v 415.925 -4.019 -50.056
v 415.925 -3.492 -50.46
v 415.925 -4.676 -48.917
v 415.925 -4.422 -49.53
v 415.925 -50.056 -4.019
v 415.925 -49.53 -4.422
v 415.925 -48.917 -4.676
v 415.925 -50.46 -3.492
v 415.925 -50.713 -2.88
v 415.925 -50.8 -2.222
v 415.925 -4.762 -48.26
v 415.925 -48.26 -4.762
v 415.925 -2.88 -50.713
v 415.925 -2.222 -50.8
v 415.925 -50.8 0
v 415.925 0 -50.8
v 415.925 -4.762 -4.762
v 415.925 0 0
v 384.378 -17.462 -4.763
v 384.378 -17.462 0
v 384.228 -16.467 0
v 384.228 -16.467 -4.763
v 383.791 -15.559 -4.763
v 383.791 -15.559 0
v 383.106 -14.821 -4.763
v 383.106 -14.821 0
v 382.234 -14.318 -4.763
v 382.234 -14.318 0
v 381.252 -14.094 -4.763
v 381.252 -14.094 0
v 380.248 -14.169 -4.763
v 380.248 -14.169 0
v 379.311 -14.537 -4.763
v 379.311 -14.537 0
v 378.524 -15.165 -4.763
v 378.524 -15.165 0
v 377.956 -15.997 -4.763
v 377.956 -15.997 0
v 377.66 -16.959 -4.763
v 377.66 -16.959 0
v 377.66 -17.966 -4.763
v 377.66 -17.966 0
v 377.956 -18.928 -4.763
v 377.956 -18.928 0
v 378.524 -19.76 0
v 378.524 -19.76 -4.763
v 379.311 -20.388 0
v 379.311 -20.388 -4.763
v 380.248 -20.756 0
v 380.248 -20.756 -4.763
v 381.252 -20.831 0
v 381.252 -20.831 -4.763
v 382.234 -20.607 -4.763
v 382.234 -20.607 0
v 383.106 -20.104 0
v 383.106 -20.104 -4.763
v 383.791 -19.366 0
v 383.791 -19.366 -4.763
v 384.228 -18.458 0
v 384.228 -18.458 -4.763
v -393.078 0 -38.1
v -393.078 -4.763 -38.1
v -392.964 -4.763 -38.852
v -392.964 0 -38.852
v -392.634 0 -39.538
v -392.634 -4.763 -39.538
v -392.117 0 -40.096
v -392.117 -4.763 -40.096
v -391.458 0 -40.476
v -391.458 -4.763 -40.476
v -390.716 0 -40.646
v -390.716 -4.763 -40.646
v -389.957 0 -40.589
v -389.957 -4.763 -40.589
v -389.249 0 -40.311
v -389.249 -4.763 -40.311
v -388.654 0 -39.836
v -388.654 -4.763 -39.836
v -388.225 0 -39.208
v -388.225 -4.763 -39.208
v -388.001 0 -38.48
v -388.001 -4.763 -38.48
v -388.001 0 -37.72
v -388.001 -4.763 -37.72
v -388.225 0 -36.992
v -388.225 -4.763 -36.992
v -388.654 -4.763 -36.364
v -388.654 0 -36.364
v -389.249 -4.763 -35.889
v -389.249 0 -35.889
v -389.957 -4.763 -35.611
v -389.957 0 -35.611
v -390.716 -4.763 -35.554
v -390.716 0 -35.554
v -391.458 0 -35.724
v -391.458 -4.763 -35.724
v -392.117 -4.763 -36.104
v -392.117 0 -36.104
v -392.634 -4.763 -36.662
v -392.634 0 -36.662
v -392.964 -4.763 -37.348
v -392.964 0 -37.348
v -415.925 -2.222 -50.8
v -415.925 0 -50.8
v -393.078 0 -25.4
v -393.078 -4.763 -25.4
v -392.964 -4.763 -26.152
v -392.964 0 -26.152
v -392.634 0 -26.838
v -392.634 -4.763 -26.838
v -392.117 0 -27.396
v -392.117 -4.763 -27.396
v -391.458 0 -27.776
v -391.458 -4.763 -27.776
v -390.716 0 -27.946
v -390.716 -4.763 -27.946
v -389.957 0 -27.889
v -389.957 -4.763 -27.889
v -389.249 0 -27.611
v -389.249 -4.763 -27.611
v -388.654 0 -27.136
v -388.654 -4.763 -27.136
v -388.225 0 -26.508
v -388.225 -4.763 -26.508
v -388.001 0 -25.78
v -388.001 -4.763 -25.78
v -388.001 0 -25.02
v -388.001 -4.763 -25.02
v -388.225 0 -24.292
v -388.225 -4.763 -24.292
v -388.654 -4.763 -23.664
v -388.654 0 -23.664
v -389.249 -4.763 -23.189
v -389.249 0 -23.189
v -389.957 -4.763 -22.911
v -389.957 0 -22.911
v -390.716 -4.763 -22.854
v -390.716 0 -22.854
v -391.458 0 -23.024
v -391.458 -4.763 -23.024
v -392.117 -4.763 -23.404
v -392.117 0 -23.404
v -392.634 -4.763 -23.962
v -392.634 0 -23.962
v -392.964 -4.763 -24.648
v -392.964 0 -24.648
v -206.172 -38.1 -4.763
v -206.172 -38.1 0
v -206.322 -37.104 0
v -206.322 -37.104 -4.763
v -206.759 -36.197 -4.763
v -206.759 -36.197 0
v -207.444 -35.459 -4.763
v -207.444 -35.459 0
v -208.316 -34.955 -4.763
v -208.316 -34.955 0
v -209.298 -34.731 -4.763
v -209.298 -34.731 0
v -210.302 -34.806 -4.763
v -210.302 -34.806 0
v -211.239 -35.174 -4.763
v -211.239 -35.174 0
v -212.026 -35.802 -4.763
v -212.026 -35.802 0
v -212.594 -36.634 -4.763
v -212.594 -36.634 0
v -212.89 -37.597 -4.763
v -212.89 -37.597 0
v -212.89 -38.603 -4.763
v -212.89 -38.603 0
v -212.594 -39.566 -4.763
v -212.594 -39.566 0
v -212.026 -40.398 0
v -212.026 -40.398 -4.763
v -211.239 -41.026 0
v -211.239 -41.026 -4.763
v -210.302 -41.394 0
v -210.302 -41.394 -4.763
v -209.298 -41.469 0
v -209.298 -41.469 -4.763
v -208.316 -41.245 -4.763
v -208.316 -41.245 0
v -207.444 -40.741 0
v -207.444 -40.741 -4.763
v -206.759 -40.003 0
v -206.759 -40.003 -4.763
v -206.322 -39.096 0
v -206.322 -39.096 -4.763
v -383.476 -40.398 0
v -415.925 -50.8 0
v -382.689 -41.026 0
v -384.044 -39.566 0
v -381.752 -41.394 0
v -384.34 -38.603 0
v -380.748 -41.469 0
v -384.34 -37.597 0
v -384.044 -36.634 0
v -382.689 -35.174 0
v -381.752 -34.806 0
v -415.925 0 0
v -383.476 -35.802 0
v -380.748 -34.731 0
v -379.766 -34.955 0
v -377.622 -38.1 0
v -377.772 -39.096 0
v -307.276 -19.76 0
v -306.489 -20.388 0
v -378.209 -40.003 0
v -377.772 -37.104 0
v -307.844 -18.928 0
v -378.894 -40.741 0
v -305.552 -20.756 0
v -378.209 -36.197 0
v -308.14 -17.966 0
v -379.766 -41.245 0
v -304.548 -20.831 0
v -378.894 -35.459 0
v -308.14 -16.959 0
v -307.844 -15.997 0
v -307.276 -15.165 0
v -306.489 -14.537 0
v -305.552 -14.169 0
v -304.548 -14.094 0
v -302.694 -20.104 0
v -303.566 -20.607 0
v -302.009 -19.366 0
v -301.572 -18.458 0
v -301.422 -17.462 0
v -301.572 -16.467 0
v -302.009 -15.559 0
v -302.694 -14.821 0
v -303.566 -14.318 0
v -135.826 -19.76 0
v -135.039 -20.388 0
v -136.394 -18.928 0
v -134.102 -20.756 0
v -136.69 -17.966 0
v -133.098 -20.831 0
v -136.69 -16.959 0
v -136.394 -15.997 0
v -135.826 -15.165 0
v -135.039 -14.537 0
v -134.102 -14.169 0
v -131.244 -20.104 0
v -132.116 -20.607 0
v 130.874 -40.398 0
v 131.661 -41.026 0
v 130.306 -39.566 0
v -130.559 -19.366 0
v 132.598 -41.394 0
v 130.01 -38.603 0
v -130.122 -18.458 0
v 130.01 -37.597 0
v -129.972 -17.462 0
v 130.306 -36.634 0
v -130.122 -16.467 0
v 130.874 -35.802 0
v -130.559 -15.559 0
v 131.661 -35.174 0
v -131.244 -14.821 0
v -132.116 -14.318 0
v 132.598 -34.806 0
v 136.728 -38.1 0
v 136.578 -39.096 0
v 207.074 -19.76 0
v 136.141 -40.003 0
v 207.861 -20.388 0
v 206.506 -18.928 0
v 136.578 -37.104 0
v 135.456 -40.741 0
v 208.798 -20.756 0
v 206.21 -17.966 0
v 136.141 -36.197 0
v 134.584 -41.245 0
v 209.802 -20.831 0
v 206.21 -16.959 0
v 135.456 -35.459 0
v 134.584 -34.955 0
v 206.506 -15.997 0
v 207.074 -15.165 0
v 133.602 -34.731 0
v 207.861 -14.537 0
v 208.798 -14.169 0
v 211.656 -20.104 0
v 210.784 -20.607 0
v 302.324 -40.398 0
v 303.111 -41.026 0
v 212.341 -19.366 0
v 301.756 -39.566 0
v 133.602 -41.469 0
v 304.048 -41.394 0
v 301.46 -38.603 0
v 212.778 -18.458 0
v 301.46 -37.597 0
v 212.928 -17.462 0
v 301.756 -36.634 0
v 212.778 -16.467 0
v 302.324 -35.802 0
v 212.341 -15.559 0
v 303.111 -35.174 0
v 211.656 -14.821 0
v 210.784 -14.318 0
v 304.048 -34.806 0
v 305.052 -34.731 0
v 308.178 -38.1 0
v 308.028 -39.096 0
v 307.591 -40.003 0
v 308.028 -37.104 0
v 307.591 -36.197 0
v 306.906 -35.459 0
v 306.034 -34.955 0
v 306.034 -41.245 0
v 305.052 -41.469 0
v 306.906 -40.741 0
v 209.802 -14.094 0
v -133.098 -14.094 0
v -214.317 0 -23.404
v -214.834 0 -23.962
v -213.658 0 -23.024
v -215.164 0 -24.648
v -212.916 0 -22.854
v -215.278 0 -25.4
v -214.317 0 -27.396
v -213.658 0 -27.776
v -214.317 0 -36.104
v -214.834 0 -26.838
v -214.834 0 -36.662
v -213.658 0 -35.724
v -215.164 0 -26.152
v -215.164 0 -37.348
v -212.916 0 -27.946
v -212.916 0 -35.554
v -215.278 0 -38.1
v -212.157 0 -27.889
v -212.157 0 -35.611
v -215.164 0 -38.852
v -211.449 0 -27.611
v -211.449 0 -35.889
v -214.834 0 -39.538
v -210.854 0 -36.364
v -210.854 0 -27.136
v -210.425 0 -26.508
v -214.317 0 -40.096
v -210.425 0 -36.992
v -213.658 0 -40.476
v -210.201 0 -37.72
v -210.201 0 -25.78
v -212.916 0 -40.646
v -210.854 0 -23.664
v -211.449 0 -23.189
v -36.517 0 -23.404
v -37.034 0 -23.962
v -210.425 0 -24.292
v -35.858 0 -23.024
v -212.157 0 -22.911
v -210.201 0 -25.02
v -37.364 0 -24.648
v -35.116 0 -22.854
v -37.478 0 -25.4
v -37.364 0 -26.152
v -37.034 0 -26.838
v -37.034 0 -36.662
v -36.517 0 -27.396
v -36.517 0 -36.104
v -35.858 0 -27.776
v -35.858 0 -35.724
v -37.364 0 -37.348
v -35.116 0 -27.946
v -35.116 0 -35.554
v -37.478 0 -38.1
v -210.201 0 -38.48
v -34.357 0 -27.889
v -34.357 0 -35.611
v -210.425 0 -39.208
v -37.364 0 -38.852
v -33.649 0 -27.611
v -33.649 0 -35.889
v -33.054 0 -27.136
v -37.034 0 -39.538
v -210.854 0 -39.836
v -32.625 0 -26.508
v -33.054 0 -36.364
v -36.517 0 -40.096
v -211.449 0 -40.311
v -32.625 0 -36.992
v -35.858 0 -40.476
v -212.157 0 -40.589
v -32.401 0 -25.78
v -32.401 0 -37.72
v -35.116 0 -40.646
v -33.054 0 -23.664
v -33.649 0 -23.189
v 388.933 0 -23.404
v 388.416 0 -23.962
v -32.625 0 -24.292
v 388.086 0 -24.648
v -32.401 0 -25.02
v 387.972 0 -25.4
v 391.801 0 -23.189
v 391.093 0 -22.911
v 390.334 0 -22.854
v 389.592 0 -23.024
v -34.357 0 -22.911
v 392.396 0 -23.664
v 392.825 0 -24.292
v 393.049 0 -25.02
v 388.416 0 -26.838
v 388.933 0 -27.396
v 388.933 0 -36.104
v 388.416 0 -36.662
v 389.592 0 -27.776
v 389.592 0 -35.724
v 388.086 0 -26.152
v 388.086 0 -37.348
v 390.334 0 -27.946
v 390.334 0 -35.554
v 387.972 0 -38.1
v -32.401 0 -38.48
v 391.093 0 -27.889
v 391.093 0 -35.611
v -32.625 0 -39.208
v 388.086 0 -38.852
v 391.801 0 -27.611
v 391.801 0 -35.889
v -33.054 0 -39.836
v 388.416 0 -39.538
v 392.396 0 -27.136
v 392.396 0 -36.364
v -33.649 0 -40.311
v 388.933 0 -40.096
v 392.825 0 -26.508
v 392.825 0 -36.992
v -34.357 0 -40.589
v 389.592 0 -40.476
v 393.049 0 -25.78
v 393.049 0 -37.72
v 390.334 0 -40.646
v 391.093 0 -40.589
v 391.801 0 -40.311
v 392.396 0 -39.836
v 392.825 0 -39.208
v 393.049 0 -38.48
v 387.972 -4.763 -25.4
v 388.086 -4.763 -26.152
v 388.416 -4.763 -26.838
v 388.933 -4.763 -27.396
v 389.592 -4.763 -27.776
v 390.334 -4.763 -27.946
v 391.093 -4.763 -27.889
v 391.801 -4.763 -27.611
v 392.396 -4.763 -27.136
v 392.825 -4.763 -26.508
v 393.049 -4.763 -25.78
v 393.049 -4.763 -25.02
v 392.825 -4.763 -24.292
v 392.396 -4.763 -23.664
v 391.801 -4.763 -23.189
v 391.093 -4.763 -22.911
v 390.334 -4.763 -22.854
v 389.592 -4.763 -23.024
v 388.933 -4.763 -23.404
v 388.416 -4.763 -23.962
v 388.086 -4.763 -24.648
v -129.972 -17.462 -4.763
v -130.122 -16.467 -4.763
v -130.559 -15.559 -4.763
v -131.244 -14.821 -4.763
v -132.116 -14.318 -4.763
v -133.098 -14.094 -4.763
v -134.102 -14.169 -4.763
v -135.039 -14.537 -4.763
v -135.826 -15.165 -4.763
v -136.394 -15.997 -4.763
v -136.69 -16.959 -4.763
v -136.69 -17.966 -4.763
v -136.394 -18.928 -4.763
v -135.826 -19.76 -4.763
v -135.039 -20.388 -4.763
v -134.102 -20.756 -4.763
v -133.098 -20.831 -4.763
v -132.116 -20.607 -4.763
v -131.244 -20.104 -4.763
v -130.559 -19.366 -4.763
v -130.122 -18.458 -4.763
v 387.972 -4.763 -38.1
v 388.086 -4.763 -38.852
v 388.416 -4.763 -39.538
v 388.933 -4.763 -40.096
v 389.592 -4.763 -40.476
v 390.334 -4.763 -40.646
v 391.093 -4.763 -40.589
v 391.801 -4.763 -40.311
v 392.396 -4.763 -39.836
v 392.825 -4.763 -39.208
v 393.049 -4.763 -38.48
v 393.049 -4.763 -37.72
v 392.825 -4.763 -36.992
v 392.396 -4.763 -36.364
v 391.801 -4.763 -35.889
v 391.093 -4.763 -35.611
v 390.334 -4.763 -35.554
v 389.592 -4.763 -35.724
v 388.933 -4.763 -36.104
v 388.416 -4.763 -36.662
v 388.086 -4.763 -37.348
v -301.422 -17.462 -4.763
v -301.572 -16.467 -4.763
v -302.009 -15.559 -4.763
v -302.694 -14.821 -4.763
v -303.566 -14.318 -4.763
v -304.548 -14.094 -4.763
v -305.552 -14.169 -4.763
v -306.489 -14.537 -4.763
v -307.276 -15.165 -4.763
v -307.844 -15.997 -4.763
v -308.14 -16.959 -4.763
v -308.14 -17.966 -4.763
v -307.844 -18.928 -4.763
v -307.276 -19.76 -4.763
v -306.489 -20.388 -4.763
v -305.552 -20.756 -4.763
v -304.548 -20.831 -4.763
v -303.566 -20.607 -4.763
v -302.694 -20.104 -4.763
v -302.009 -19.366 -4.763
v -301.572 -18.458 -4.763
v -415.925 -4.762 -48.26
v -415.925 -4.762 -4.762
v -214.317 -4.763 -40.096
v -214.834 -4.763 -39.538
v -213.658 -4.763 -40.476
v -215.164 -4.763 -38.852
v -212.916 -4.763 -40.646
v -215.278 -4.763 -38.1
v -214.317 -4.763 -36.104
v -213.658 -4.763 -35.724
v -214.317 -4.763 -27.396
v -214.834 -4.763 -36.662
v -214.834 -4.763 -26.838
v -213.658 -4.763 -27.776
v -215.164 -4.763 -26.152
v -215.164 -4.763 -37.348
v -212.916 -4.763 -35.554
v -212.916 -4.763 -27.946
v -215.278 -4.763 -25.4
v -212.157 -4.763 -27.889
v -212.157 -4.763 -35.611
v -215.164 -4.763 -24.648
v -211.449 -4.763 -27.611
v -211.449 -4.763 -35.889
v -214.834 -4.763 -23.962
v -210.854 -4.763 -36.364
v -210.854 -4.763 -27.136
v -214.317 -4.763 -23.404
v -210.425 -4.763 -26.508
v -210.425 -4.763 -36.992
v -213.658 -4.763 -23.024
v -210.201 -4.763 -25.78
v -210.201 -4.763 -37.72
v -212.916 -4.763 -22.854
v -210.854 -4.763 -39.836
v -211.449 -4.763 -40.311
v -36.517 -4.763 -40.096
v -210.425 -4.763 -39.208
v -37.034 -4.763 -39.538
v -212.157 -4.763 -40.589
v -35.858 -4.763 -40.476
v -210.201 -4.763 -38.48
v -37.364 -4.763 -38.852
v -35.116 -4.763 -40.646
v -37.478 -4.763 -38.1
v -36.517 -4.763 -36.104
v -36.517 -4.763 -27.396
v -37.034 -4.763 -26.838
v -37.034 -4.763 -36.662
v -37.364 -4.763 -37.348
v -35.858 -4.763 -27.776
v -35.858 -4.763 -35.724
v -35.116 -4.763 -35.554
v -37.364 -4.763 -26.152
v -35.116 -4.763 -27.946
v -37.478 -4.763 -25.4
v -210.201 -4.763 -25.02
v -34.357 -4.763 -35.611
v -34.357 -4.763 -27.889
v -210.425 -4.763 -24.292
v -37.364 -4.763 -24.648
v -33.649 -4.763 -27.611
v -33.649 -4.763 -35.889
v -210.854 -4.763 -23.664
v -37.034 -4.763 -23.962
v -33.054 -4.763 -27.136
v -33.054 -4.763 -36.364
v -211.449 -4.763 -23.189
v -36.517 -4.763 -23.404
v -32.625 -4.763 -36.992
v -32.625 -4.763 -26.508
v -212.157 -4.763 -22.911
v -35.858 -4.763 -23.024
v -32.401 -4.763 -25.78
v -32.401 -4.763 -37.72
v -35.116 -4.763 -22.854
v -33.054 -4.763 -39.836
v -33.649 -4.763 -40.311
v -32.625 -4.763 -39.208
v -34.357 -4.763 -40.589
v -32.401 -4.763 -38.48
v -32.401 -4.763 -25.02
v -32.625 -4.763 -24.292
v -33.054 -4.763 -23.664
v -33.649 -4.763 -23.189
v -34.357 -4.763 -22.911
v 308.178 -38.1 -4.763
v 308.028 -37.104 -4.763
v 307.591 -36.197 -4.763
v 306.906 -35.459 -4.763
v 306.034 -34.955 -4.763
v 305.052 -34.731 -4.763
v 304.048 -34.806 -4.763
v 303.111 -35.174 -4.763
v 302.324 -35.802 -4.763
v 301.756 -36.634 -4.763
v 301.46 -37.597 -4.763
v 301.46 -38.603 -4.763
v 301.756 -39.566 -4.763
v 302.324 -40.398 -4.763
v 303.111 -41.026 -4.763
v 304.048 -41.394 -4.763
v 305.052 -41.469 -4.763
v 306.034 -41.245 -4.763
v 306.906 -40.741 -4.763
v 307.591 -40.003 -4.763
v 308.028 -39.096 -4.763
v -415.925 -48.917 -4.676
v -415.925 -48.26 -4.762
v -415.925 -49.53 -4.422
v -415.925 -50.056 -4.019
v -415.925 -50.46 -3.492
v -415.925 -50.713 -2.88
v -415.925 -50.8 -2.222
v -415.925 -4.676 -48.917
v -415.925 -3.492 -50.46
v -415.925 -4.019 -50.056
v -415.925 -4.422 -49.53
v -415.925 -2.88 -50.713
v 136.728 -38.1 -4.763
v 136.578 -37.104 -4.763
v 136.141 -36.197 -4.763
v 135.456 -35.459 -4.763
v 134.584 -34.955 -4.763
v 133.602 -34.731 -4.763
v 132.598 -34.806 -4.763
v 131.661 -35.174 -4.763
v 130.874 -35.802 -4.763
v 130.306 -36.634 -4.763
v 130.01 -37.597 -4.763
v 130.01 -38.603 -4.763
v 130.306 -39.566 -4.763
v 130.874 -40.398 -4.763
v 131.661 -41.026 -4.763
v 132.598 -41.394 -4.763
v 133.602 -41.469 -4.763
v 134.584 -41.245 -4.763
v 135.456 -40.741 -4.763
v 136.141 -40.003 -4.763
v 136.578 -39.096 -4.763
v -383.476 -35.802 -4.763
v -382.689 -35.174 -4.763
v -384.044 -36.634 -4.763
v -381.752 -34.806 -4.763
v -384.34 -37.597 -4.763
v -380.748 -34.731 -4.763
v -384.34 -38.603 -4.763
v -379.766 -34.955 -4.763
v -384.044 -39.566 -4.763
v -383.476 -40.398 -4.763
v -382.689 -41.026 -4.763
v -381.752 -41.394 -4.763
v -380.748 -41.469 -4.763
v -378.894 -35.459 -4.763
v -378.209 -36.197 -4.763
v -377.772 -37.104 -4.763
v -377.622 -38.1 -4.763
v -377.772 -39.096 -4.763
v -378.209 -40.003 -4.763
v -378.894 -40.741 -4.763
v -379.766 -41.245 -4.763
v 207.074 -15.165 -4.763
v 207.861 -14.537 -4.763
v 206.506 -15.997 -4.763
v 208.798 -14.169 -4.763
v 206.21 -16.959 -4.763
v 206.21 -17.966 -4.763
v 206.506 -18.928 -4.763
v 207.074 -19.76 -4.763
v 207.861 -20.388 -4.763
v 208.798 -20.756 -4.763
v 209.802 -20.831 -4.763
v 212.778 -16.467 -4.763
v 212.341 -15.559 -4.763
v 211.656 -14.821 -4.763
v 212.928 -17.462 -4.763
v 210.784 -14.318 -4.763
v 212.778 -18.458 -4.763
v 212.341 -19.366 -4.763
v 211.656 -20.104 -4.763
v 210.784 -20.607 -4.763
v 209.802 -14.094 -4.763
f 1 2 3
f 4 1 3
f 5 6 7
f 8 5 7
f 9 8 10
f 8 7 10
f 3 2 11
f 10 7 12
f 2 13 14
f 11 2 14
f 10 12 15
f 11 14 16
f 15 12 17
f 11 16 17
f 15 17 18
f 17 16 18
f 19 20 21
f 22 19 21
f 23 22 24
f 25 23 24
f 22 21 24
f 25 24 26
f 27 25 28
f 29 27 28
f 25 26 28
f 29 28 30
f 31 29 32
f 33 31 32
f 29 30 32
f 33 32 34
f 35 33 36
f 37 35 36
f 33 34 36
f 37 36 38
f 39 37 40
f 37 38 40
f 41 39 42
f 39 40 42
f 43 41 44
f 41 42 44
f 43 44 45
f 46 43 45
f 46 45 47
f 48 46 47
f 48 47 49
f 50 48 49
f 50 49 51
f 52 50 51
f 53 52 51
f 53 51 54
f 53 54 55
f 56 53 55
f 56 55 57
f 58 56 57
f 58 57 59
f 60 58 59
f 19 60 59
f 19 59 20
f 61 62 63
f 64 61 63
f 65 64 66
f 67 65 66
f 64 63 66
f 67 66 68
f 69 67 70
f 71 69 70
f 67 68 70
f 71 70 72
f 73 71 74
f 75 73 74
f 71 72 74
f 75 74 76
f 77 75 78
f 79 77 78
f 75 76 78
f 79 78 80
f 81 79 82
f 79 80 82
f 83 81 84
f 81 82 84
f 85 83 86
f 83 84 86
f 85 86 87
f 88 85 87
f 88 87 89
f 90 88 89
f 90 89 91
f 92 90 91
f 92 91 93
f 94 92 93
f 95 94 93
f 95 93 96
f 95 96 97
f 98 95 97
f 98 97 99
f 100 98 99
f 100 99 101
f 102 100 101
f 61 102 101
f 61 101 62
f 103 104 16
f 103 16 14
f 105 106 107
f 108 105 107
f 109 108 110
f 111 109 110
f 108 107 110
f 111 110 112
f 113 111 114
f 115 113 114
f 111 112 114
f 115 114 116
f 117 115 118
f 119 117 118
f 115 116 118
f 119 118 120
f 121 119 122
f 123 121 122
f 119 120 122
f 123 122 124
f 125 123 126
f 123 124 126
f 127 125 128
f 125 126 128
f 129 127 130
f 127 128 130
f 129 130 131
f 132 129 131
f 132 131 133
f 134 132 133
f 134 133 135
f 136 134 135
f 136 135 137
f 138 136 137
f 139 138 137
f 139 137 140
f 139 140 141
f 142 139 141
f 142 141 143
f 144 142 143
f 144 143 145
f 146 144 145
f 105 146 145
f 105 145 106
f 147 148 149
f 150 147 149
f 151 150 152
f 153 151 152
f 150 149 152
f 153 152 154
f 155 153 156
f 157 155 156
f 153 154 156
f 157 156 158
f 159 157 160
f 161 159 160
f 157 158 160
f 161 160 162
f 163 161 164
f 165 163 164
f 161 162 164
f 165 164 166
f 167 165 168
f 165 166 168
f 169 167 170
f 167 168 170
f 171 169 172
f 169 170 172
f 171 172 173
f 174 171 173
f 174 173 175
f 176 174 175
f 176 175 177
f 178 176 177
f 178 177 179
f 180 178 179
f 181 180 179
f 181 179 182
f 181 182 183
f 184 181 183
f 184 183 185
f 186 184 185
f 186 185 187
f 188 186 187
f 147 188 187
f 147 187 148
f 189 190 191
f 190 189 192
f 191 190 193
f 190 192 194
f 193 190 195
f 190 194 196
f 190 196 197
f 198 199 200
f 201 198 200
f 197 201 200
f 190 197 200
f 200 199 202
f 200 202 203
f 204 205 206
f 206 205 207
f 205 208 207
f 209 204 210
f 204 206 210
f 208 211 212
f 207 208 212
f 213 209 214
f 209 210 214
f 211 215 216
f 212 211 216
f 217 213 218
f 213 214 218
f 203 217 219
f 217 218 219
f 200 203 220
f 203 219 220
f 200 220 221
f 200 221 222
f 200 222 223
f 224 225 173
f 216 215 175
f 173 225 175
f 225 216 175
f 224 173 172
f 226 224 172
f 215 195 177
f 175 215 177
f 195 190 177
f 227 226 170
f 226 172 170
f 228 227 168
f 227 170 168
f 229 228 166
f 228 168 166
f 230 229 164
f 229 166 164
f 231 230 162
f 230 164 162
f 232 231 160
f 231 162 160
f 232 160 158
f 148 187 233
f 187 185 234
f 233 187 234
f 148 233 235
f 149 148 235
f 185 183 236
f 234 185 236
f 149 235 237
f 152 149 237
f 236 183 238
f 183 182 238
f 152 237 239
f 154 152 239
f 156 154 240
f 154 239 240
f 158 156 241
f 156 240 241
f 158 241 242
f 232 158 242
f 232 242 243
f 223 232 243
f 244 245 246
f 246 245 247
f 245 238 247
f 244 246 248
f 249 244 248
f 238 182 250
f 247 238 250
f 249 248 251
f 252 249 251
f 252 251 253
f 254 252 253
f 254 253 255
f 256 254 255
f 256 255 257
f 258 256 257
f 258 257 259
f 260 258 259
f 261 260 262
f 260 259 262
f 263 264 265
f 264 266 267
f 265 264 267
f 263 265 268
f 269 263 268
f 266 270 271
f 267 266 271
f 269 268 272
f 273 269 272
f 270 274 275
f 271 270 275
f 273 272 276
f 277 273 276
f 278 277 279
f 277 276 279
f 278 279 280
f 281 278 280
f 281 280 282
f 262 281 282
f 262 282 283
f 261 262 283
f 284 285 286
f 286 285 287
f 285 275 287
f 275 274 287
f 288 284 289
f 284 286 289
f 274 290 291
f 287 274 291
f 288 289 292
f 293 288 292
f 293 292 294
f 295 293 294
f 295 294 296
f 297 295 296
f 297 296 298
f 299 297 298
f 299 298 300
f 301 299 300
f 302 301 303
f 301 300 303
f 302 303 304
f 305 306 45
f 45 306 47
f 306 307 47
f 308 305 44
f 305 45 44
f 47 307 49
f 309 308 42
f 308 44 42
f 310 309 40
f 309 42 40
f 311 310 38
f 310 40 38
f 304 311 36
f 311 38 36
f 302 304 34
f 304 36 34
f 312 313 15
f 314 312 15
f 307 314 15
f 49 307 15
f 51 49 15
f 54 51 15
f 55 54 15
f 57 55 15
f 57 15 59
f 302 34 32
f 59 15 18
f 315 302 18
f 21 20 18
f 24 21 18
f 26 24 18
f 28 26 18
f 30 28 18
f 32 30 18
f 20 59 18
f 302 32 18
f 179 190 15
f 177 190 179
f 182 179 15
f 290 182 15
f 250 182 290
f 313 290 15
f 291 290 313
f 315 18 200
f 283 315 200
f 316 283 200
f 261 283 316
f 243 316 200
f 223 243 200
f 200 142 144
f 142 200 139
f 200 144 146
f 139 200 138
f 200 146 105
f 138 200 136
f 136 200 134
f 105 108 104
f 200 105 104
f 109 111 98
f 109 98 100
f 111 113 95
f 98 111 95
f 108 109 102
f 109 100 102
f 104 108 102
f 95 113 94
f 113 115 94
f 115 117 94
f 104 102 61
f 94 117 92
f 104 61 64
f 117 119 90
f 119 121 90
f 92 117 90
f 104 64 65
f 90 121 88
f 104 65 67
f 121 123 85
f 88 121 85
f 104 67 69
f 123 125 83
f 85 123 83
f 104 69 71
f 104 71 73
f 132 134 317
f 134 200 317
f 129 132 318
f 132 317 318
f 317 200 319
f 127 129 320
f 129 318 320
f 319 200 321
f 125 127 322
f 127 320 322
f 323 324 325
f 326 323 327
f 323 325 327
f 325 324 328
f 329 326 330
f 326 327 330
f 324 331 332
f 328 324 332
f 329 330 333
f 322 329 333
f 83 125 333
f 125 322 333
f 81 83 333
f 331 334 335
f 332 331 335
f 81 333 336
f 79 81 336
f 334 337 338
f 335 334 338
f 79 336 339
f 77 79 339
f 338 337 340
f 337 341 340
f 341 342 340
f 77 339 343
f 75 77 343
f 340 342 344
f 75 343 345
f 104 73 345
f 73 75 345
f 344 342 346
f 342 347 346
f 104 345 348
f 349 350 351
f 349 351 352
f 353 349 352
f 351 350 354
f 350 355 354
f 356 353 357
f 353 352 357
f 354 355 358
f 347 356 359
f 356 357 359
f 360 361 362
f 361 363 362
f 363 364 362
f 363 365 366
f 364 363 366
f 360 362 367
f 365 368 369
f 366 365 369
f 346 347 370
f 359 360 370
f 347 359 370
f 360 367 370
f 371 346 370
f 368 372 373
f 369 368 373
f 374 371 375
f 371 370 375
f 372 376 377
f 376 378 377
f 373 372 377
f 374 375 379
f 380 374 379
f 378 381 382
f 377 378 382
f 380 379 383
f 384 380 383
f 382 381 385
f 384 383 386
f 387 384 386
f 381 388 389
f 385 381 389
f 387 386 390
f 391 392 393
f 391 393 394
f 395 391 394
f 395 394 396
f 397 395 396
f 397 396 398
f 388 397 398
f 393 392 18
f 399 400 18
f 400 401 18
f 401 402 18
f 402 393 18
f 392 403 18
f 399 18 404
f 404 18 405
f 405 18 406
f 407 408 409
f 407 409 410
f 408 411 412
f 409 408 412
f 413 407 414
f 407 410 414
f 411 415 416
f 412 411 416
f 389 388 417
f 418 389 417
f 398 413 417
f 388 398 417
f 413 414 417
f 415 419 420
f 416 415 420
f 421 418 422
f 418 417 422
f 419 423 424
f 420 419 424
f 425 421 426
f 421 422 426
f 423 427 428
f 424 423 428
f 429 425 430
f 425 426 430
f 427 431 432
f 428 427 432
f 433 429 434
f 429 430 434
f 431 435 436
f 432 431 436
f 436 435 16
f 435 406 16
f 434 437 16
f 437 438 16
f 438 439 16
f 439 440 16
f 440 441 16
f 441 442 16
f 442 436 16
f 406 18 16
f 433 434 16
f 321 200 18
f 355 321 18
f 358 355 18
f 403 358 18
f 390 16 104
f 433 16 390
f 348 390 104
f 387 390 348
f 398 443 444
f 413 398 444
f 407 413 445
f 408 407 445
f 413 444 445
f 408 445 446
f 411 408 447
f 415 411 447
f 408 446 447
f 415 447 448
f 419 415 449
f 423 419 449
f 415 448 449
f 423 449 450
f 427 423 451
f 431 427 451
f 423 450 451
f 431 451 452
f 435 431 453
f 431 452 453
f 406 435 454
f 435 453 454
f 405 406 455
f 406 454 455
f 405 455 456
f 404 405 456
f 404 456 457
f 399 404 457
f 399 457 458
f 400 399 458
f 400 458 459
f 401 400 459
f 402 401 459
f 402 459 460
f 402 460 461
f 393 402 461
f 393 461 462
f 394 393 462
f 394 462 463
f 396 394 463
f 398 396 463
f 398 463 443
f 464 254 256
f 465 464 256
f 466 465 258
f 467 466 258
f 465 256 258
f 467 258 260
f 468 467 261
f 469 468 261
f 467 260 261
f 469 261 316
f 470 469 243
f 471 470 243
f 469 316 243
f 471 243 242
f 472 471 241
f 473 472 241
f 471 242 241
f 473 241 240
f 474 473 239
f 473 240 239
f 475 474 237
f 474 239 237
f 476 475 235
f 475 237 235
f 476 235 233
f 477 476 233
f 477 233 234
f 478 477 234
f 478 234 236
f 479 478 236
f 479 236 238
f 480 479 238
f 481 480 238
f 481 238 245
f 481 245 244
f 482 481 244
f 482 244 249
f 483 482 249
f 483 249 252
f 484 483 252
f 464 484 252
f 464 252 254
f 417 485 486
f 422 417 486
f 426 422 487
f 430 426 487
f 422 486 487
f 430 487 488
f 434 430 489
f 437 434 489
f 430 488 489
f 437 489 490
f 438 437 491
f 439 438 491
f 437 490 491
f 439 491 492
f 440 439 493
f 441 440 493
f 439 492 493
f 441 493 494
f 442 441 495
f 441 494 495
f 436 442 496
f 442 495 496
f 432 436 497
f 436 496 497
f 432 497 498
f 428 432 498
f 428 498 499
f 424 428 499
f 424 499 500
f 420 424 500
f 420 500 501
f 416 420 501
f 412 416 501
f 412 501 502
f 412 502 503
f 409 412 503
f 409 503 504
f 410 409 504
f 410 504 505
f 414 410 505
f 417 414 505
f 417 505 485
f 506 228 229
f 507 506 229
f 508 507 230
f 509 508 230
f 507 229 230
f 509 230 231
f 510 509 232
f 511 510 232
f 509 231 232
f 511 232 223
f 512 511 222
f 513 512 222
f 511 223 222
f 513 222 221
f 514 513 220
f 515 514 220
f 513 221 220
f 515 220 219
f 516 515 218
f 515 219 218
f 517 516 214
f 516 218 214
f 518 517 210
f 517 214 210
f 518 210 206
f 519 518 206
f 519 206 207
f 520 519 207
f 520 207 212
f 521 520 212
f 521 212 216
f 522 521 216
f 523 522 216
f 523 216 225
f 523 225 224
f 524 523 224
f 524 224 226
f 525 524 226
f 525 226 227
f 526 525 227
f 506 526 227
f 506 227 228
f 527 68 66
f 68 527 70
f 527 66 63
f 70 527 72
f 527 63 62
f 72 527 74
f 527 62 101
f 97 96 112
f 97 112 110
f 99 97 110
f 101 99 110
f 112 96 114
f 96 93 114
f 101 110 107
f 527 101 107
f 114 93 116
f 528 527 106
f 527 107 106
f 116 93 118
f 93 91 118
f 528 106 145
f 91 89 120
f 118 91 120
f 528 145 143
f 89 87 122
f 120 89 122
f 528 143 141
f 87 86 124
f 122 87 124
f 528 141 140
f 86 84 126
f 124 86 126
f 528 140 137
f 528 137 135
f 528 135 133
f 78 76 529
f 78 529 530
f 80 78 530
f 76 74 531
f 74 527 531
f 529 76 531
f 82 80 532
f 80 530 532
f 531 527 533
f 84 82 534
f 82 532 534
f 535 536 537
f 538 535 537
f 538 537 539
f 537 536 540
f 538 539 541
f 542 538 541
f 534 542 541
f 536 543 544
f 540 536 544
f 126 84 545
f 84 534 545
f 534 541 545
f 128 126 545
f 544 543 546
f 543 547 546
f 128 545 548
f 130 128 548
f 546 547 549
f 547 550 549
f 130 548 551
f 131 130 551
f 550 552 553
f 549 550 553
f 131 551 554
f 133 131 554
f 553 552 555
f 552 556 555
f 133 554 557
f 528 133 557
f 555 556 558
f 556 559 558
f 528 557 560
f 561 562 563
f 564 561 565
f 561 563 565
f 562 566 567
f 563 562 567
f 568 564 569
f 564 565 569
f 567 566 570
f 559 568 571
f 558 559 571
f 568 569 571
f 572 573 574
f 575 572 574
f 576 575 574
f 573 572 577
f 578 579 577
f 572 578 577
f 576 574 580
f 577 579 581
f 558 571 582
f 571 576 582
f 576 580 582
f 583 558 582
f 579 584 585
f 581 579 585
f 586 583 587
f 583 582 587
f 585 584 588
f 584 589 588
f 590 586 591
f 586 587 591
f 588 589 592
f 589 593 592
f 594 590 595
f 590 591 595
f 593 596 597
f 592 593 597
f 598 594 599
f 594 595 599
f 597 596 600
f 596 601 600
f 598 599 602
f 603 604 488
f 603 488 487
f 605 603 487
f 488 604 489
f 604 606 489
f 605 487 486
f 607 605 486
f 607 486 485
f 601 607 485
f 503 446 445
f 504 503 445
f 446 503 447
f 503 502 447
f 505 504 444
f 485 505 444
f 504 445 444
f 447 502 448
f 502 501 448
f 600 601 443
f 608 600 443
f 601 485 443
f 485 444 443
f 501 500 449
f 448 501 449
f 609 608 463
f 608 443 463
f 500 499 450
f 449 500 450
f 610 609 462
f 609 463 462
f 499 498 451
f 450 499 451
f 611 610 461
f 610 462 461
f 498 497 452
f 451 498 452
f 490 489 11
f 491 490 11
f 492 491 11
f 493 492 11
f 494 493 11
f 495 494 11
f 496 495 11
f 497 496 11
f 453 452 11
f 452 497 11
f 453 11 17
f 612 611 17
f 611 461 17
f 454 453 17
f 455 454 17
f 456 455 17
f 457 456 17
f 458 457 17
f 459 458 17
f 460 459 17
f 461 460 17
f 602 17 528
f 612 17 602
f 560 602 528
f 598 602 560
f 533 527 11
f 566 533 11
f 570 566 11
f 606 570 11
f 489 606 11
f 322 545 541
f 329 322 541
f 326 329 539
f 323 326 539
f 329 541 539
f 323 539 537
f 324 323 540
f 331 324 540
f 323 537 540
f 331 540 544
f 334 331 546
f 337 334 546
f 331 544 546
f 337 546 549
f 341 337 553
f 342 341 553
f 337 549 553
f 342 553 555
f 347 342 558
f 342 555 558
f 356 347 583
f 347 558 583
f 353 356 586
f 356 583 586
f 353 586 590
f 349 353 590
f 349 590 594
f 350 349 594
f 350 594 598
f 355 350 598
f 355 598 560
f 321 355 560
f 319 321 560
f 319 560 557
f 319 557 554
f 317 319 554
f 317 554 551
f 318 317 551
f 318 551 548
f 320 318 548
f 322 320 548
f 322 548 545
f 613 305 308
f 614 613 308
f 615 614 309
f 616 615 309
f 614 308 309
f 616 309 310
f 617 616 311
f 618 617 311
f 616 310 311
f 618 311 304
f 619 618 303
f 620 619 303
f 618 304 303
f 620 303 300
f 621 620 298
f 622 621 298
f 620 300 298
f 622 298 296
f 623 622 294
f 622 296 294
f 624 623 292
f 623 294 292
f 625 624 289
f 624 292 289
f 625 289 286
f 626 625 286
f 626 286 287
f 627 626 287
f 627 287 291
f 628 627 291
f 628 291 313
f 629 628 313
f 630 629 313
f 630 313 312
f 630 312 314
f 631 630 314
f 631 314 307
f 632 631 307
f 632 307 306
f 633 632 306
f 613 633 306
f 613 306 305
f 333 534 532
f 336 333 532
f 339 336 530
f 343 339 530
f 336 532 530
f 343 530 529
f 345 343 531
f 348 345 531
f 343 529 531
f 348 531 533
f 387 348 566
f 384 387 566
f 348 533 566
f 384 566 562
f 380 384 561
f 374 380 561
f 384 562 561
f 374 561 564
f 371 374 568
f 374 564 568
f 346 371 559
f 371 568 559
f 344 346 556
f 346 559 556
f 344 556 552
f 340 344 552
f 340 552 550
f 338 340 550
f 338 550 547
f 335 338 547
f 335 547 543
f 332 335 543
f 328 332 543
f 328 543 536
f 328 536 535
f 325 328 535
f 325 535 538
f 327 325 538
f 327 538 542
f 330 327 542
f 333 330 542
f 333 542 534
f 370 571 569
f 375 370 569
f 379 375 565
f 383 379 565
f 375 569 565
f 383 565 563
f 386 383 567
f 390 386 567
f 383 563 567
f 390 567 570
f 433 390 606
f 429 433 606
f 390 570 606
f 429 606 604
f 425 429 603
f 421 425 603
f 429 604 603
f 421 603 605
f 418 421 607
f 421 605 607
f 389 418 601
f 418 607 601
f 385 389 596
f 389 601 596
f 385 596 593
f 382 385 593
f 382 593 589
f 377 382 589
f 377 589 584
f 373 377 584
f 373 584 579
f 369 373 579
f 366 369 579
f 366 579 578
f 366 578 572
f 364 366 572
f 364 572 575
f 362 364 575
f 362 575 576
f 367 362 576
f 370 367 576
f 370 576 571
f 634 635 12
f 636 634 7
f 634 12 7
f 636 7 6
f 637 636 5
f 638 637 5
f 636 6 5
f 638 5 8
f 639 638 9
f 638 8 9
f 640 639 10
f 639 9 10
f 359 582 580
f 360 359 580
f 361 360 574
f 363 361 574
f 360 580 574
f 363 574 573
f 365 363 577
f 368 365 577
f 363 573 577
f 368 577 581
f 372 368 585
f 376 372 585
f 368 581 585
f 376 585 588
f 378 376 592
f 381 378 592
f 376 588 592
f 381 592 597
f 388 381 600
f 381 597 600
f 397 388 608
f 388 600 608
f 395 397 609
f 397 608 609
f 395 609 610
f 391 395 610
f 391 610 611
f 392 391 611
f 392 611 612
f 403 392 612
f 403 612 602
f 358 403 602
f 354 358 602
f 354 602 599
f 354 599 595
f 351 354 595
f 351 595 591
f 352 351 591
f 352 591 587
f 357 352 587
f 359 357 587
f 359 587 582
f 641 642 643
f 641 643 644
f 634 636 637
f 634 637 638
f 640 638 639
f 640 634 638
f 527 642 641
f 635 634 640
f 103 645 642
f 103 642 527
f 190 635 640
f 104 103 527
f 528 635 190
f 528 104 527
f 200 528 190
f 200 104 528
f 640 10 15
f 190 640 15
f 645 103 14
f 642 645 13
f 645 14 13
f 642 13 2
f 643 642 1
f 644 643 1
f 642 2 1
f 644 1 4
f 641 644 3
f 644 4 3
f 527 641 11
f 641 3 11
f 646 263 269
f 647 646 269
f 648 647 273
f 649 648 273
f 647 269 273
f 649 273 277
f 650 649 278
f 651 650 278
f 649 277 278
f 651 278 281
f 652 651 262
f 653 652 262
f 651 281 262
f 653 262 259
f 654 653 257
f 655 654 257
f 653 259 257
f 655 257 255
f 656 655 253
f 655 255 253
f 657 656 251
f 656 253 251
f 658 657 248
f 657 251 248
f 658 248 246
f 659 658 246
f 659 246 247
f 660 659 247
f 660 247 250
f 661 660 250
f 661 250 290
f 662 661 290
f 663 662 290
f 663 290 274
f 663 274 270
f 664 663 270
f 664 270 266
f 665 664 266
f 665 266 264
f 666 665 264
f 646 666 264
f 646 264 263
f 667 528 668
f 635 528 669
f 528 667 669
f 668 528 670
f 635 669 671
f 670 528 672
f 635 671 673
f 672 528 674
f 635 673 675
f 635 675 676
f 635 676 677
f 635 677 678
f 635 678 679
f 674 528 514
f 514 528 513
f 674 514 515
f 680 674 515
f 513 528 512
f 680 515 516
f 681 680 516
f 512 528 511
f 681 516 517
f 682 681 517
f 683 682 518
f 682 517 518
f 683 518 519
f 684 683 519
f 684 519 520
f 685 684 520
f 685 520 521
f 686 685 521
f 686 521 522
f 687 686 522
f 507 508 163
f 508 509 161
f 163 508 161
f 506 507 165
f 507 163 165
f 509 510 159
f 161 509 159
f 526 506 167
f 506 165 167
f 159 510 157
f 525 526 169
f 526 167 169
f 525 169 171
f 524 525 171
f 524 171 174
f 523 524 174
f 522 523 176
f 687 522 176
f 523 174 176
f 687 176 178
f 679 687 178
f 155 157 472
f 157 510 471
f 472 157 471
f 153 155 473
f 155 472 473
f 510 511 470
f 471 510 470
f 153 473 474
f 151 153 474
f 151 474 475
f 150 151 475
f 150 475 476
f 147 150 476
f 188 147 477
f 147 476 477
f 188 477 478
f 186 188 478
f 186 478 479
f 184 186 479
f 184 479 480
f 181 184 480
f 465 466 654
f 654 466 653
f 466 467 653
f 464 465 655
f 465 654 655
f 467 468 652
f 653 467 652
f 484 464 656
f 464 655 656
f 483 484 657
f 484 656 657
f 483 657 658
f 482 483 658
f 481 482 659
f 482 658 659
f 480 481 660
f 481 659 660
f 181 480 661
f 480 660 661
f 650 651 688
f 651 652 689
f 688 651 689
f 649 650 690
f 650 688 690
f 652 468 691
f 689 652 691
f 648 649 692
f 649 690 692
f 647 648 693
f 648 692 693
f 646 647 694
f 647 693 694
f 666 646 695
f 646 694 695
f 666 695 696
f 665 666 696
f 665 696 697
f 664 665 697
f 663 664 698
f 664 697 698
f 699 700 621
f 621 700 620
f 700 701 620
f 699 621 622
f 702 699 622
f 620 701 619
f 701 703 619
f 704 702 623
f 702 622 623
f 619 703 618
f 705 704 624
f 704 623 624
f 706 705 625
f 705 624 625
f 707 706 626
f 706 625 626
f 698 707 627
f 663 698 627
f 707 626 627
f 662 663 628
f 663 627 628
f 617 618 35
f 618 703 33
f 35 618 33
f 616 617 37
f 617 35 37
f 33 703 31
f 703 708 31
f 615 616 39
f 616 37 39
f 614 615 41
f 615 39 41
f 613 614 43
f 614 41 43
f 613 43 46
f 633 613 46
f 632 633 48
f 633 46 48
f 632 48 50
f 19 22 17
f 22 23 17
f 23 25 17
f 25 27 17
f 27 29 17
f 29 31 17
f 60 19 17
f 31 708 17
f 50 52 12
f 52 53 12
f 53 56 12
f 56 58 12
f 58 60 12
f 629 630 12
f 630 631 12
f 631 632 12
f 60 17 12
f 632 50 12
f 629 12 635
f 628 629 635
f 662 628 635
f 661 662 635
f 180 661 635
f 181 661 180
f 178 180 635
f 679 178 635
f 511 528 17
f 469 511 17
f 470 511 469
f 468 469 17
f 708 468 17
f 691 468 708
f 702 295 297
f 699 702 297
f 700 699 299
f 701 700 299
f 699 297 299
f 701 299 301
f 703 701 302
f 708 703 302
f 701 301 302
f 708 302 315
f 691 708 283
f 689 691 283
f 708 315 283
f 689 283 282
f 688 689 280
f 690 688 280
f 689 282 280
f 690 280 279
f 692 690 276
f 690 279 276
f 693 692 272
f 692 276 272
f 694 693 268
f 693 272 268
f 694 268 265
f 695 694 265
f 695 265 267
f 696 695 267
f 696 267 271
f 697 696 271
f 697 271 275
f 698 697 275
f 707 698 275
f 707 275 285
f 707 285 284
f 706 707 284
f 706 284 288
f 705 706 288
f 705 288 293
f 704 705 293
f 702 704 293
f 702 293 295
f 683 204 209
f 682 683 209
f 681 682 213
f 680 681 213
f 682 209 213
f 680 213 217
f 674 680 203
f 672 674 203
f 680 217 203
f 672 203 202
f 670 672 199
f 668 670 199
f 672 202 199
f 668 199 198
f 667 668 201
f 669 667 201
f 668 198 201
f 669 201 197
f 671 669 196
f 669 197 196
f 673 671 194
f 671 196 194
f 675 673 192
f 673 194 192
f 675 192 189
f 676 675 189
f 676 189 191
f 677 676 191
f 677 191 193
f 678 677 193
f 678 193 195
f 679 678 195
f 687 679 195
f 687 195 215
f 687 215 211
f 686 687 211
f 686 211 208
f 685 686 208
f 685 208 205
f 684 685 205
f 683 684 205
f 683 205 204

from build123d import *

# Parameters (mm, degrees)
BOSS_EXTRUDE1_DEPTH     = 415.925
F_1_4_CLEARANCE_HOLE1_D = 6.7564
LPATTERN1_COUNT         = 5
LPATTERN1_PITCH         = 171.45
F_10_CLEARANCE_HOLE2_D  = 5.1054


with BuildPart() as part:
    # Sketch1 → Boss-Extrude1 (new, symmetric)
    with BuildSketch(Plane(origin=(0, 0, 0), x_dir=(0, 0, -1), z_dir=(1, 0, 0))):
        with BuildLine():
            Line((0, 0), (50.8, 0))
            Line((50.8, 0), (50.8, -2.2225))
            ThreePointArc((50.8, -2.2225), (50.056051224, -4.018551224), (48.26, -4.7625))
            Line((48.26, -4.7625), (4.7625, -4.7625))
            Line((4.7625, -4.7625), (4.7625, -48.26))
            ThreePointArc((4.7625, -48.26), (4.018551224, -50.056051224), (2.2225, -50.8))
            Line((2.2225, -50.8), (0, -50.8))
            Line((0, -50.8), (0, 0))
        make_face()
    extrude(amount=BOSS_EXTRUDE1_DEPTH, both=True)

    # 1/4 Clearance Hole1 (through all)
    with Locations(Plane(origin=(0, 0, -4.7625), x_dir=(-1, 0, 0), z_dir=(0, 0, -1))):
        with Locations((-381, -17.4625), (-304.8, -38.1)):
            f_1_4_clearance_hole1 = Hole(F_1_4_CLEARANCE_HOLE1_D / 2)

    # LPattern1: 1/4 Clearance Hole1 ×5, 1 skipped
    with Locations(*[(-i * LPATTERN1_PITCH, 0, 0) for i in range(1, LPATTERN1_COUNT) if i not in (2,)]):
        add(f_1_4_clearance_hole1, mode=Mode.SUBTRACT)

    # #10 Clearance Hole2 (through all)
    with Locations(Plane(origin=(0, 0, 0), x_dir=(1, 0, 0), z_dir=(0, 1, 0))):
        with Locations((-34.925, 25.4), (-34.925, 38.1), (-212.725, 38.1), (-212.725, 25.4), (-390.525, 25.4), (-390.525, 38.1), (390.525, 38.1), (390.525, 25.4)):
            Hole(F_10_CLEARANCE_HOLE2_D / 2)


solid = part.part
